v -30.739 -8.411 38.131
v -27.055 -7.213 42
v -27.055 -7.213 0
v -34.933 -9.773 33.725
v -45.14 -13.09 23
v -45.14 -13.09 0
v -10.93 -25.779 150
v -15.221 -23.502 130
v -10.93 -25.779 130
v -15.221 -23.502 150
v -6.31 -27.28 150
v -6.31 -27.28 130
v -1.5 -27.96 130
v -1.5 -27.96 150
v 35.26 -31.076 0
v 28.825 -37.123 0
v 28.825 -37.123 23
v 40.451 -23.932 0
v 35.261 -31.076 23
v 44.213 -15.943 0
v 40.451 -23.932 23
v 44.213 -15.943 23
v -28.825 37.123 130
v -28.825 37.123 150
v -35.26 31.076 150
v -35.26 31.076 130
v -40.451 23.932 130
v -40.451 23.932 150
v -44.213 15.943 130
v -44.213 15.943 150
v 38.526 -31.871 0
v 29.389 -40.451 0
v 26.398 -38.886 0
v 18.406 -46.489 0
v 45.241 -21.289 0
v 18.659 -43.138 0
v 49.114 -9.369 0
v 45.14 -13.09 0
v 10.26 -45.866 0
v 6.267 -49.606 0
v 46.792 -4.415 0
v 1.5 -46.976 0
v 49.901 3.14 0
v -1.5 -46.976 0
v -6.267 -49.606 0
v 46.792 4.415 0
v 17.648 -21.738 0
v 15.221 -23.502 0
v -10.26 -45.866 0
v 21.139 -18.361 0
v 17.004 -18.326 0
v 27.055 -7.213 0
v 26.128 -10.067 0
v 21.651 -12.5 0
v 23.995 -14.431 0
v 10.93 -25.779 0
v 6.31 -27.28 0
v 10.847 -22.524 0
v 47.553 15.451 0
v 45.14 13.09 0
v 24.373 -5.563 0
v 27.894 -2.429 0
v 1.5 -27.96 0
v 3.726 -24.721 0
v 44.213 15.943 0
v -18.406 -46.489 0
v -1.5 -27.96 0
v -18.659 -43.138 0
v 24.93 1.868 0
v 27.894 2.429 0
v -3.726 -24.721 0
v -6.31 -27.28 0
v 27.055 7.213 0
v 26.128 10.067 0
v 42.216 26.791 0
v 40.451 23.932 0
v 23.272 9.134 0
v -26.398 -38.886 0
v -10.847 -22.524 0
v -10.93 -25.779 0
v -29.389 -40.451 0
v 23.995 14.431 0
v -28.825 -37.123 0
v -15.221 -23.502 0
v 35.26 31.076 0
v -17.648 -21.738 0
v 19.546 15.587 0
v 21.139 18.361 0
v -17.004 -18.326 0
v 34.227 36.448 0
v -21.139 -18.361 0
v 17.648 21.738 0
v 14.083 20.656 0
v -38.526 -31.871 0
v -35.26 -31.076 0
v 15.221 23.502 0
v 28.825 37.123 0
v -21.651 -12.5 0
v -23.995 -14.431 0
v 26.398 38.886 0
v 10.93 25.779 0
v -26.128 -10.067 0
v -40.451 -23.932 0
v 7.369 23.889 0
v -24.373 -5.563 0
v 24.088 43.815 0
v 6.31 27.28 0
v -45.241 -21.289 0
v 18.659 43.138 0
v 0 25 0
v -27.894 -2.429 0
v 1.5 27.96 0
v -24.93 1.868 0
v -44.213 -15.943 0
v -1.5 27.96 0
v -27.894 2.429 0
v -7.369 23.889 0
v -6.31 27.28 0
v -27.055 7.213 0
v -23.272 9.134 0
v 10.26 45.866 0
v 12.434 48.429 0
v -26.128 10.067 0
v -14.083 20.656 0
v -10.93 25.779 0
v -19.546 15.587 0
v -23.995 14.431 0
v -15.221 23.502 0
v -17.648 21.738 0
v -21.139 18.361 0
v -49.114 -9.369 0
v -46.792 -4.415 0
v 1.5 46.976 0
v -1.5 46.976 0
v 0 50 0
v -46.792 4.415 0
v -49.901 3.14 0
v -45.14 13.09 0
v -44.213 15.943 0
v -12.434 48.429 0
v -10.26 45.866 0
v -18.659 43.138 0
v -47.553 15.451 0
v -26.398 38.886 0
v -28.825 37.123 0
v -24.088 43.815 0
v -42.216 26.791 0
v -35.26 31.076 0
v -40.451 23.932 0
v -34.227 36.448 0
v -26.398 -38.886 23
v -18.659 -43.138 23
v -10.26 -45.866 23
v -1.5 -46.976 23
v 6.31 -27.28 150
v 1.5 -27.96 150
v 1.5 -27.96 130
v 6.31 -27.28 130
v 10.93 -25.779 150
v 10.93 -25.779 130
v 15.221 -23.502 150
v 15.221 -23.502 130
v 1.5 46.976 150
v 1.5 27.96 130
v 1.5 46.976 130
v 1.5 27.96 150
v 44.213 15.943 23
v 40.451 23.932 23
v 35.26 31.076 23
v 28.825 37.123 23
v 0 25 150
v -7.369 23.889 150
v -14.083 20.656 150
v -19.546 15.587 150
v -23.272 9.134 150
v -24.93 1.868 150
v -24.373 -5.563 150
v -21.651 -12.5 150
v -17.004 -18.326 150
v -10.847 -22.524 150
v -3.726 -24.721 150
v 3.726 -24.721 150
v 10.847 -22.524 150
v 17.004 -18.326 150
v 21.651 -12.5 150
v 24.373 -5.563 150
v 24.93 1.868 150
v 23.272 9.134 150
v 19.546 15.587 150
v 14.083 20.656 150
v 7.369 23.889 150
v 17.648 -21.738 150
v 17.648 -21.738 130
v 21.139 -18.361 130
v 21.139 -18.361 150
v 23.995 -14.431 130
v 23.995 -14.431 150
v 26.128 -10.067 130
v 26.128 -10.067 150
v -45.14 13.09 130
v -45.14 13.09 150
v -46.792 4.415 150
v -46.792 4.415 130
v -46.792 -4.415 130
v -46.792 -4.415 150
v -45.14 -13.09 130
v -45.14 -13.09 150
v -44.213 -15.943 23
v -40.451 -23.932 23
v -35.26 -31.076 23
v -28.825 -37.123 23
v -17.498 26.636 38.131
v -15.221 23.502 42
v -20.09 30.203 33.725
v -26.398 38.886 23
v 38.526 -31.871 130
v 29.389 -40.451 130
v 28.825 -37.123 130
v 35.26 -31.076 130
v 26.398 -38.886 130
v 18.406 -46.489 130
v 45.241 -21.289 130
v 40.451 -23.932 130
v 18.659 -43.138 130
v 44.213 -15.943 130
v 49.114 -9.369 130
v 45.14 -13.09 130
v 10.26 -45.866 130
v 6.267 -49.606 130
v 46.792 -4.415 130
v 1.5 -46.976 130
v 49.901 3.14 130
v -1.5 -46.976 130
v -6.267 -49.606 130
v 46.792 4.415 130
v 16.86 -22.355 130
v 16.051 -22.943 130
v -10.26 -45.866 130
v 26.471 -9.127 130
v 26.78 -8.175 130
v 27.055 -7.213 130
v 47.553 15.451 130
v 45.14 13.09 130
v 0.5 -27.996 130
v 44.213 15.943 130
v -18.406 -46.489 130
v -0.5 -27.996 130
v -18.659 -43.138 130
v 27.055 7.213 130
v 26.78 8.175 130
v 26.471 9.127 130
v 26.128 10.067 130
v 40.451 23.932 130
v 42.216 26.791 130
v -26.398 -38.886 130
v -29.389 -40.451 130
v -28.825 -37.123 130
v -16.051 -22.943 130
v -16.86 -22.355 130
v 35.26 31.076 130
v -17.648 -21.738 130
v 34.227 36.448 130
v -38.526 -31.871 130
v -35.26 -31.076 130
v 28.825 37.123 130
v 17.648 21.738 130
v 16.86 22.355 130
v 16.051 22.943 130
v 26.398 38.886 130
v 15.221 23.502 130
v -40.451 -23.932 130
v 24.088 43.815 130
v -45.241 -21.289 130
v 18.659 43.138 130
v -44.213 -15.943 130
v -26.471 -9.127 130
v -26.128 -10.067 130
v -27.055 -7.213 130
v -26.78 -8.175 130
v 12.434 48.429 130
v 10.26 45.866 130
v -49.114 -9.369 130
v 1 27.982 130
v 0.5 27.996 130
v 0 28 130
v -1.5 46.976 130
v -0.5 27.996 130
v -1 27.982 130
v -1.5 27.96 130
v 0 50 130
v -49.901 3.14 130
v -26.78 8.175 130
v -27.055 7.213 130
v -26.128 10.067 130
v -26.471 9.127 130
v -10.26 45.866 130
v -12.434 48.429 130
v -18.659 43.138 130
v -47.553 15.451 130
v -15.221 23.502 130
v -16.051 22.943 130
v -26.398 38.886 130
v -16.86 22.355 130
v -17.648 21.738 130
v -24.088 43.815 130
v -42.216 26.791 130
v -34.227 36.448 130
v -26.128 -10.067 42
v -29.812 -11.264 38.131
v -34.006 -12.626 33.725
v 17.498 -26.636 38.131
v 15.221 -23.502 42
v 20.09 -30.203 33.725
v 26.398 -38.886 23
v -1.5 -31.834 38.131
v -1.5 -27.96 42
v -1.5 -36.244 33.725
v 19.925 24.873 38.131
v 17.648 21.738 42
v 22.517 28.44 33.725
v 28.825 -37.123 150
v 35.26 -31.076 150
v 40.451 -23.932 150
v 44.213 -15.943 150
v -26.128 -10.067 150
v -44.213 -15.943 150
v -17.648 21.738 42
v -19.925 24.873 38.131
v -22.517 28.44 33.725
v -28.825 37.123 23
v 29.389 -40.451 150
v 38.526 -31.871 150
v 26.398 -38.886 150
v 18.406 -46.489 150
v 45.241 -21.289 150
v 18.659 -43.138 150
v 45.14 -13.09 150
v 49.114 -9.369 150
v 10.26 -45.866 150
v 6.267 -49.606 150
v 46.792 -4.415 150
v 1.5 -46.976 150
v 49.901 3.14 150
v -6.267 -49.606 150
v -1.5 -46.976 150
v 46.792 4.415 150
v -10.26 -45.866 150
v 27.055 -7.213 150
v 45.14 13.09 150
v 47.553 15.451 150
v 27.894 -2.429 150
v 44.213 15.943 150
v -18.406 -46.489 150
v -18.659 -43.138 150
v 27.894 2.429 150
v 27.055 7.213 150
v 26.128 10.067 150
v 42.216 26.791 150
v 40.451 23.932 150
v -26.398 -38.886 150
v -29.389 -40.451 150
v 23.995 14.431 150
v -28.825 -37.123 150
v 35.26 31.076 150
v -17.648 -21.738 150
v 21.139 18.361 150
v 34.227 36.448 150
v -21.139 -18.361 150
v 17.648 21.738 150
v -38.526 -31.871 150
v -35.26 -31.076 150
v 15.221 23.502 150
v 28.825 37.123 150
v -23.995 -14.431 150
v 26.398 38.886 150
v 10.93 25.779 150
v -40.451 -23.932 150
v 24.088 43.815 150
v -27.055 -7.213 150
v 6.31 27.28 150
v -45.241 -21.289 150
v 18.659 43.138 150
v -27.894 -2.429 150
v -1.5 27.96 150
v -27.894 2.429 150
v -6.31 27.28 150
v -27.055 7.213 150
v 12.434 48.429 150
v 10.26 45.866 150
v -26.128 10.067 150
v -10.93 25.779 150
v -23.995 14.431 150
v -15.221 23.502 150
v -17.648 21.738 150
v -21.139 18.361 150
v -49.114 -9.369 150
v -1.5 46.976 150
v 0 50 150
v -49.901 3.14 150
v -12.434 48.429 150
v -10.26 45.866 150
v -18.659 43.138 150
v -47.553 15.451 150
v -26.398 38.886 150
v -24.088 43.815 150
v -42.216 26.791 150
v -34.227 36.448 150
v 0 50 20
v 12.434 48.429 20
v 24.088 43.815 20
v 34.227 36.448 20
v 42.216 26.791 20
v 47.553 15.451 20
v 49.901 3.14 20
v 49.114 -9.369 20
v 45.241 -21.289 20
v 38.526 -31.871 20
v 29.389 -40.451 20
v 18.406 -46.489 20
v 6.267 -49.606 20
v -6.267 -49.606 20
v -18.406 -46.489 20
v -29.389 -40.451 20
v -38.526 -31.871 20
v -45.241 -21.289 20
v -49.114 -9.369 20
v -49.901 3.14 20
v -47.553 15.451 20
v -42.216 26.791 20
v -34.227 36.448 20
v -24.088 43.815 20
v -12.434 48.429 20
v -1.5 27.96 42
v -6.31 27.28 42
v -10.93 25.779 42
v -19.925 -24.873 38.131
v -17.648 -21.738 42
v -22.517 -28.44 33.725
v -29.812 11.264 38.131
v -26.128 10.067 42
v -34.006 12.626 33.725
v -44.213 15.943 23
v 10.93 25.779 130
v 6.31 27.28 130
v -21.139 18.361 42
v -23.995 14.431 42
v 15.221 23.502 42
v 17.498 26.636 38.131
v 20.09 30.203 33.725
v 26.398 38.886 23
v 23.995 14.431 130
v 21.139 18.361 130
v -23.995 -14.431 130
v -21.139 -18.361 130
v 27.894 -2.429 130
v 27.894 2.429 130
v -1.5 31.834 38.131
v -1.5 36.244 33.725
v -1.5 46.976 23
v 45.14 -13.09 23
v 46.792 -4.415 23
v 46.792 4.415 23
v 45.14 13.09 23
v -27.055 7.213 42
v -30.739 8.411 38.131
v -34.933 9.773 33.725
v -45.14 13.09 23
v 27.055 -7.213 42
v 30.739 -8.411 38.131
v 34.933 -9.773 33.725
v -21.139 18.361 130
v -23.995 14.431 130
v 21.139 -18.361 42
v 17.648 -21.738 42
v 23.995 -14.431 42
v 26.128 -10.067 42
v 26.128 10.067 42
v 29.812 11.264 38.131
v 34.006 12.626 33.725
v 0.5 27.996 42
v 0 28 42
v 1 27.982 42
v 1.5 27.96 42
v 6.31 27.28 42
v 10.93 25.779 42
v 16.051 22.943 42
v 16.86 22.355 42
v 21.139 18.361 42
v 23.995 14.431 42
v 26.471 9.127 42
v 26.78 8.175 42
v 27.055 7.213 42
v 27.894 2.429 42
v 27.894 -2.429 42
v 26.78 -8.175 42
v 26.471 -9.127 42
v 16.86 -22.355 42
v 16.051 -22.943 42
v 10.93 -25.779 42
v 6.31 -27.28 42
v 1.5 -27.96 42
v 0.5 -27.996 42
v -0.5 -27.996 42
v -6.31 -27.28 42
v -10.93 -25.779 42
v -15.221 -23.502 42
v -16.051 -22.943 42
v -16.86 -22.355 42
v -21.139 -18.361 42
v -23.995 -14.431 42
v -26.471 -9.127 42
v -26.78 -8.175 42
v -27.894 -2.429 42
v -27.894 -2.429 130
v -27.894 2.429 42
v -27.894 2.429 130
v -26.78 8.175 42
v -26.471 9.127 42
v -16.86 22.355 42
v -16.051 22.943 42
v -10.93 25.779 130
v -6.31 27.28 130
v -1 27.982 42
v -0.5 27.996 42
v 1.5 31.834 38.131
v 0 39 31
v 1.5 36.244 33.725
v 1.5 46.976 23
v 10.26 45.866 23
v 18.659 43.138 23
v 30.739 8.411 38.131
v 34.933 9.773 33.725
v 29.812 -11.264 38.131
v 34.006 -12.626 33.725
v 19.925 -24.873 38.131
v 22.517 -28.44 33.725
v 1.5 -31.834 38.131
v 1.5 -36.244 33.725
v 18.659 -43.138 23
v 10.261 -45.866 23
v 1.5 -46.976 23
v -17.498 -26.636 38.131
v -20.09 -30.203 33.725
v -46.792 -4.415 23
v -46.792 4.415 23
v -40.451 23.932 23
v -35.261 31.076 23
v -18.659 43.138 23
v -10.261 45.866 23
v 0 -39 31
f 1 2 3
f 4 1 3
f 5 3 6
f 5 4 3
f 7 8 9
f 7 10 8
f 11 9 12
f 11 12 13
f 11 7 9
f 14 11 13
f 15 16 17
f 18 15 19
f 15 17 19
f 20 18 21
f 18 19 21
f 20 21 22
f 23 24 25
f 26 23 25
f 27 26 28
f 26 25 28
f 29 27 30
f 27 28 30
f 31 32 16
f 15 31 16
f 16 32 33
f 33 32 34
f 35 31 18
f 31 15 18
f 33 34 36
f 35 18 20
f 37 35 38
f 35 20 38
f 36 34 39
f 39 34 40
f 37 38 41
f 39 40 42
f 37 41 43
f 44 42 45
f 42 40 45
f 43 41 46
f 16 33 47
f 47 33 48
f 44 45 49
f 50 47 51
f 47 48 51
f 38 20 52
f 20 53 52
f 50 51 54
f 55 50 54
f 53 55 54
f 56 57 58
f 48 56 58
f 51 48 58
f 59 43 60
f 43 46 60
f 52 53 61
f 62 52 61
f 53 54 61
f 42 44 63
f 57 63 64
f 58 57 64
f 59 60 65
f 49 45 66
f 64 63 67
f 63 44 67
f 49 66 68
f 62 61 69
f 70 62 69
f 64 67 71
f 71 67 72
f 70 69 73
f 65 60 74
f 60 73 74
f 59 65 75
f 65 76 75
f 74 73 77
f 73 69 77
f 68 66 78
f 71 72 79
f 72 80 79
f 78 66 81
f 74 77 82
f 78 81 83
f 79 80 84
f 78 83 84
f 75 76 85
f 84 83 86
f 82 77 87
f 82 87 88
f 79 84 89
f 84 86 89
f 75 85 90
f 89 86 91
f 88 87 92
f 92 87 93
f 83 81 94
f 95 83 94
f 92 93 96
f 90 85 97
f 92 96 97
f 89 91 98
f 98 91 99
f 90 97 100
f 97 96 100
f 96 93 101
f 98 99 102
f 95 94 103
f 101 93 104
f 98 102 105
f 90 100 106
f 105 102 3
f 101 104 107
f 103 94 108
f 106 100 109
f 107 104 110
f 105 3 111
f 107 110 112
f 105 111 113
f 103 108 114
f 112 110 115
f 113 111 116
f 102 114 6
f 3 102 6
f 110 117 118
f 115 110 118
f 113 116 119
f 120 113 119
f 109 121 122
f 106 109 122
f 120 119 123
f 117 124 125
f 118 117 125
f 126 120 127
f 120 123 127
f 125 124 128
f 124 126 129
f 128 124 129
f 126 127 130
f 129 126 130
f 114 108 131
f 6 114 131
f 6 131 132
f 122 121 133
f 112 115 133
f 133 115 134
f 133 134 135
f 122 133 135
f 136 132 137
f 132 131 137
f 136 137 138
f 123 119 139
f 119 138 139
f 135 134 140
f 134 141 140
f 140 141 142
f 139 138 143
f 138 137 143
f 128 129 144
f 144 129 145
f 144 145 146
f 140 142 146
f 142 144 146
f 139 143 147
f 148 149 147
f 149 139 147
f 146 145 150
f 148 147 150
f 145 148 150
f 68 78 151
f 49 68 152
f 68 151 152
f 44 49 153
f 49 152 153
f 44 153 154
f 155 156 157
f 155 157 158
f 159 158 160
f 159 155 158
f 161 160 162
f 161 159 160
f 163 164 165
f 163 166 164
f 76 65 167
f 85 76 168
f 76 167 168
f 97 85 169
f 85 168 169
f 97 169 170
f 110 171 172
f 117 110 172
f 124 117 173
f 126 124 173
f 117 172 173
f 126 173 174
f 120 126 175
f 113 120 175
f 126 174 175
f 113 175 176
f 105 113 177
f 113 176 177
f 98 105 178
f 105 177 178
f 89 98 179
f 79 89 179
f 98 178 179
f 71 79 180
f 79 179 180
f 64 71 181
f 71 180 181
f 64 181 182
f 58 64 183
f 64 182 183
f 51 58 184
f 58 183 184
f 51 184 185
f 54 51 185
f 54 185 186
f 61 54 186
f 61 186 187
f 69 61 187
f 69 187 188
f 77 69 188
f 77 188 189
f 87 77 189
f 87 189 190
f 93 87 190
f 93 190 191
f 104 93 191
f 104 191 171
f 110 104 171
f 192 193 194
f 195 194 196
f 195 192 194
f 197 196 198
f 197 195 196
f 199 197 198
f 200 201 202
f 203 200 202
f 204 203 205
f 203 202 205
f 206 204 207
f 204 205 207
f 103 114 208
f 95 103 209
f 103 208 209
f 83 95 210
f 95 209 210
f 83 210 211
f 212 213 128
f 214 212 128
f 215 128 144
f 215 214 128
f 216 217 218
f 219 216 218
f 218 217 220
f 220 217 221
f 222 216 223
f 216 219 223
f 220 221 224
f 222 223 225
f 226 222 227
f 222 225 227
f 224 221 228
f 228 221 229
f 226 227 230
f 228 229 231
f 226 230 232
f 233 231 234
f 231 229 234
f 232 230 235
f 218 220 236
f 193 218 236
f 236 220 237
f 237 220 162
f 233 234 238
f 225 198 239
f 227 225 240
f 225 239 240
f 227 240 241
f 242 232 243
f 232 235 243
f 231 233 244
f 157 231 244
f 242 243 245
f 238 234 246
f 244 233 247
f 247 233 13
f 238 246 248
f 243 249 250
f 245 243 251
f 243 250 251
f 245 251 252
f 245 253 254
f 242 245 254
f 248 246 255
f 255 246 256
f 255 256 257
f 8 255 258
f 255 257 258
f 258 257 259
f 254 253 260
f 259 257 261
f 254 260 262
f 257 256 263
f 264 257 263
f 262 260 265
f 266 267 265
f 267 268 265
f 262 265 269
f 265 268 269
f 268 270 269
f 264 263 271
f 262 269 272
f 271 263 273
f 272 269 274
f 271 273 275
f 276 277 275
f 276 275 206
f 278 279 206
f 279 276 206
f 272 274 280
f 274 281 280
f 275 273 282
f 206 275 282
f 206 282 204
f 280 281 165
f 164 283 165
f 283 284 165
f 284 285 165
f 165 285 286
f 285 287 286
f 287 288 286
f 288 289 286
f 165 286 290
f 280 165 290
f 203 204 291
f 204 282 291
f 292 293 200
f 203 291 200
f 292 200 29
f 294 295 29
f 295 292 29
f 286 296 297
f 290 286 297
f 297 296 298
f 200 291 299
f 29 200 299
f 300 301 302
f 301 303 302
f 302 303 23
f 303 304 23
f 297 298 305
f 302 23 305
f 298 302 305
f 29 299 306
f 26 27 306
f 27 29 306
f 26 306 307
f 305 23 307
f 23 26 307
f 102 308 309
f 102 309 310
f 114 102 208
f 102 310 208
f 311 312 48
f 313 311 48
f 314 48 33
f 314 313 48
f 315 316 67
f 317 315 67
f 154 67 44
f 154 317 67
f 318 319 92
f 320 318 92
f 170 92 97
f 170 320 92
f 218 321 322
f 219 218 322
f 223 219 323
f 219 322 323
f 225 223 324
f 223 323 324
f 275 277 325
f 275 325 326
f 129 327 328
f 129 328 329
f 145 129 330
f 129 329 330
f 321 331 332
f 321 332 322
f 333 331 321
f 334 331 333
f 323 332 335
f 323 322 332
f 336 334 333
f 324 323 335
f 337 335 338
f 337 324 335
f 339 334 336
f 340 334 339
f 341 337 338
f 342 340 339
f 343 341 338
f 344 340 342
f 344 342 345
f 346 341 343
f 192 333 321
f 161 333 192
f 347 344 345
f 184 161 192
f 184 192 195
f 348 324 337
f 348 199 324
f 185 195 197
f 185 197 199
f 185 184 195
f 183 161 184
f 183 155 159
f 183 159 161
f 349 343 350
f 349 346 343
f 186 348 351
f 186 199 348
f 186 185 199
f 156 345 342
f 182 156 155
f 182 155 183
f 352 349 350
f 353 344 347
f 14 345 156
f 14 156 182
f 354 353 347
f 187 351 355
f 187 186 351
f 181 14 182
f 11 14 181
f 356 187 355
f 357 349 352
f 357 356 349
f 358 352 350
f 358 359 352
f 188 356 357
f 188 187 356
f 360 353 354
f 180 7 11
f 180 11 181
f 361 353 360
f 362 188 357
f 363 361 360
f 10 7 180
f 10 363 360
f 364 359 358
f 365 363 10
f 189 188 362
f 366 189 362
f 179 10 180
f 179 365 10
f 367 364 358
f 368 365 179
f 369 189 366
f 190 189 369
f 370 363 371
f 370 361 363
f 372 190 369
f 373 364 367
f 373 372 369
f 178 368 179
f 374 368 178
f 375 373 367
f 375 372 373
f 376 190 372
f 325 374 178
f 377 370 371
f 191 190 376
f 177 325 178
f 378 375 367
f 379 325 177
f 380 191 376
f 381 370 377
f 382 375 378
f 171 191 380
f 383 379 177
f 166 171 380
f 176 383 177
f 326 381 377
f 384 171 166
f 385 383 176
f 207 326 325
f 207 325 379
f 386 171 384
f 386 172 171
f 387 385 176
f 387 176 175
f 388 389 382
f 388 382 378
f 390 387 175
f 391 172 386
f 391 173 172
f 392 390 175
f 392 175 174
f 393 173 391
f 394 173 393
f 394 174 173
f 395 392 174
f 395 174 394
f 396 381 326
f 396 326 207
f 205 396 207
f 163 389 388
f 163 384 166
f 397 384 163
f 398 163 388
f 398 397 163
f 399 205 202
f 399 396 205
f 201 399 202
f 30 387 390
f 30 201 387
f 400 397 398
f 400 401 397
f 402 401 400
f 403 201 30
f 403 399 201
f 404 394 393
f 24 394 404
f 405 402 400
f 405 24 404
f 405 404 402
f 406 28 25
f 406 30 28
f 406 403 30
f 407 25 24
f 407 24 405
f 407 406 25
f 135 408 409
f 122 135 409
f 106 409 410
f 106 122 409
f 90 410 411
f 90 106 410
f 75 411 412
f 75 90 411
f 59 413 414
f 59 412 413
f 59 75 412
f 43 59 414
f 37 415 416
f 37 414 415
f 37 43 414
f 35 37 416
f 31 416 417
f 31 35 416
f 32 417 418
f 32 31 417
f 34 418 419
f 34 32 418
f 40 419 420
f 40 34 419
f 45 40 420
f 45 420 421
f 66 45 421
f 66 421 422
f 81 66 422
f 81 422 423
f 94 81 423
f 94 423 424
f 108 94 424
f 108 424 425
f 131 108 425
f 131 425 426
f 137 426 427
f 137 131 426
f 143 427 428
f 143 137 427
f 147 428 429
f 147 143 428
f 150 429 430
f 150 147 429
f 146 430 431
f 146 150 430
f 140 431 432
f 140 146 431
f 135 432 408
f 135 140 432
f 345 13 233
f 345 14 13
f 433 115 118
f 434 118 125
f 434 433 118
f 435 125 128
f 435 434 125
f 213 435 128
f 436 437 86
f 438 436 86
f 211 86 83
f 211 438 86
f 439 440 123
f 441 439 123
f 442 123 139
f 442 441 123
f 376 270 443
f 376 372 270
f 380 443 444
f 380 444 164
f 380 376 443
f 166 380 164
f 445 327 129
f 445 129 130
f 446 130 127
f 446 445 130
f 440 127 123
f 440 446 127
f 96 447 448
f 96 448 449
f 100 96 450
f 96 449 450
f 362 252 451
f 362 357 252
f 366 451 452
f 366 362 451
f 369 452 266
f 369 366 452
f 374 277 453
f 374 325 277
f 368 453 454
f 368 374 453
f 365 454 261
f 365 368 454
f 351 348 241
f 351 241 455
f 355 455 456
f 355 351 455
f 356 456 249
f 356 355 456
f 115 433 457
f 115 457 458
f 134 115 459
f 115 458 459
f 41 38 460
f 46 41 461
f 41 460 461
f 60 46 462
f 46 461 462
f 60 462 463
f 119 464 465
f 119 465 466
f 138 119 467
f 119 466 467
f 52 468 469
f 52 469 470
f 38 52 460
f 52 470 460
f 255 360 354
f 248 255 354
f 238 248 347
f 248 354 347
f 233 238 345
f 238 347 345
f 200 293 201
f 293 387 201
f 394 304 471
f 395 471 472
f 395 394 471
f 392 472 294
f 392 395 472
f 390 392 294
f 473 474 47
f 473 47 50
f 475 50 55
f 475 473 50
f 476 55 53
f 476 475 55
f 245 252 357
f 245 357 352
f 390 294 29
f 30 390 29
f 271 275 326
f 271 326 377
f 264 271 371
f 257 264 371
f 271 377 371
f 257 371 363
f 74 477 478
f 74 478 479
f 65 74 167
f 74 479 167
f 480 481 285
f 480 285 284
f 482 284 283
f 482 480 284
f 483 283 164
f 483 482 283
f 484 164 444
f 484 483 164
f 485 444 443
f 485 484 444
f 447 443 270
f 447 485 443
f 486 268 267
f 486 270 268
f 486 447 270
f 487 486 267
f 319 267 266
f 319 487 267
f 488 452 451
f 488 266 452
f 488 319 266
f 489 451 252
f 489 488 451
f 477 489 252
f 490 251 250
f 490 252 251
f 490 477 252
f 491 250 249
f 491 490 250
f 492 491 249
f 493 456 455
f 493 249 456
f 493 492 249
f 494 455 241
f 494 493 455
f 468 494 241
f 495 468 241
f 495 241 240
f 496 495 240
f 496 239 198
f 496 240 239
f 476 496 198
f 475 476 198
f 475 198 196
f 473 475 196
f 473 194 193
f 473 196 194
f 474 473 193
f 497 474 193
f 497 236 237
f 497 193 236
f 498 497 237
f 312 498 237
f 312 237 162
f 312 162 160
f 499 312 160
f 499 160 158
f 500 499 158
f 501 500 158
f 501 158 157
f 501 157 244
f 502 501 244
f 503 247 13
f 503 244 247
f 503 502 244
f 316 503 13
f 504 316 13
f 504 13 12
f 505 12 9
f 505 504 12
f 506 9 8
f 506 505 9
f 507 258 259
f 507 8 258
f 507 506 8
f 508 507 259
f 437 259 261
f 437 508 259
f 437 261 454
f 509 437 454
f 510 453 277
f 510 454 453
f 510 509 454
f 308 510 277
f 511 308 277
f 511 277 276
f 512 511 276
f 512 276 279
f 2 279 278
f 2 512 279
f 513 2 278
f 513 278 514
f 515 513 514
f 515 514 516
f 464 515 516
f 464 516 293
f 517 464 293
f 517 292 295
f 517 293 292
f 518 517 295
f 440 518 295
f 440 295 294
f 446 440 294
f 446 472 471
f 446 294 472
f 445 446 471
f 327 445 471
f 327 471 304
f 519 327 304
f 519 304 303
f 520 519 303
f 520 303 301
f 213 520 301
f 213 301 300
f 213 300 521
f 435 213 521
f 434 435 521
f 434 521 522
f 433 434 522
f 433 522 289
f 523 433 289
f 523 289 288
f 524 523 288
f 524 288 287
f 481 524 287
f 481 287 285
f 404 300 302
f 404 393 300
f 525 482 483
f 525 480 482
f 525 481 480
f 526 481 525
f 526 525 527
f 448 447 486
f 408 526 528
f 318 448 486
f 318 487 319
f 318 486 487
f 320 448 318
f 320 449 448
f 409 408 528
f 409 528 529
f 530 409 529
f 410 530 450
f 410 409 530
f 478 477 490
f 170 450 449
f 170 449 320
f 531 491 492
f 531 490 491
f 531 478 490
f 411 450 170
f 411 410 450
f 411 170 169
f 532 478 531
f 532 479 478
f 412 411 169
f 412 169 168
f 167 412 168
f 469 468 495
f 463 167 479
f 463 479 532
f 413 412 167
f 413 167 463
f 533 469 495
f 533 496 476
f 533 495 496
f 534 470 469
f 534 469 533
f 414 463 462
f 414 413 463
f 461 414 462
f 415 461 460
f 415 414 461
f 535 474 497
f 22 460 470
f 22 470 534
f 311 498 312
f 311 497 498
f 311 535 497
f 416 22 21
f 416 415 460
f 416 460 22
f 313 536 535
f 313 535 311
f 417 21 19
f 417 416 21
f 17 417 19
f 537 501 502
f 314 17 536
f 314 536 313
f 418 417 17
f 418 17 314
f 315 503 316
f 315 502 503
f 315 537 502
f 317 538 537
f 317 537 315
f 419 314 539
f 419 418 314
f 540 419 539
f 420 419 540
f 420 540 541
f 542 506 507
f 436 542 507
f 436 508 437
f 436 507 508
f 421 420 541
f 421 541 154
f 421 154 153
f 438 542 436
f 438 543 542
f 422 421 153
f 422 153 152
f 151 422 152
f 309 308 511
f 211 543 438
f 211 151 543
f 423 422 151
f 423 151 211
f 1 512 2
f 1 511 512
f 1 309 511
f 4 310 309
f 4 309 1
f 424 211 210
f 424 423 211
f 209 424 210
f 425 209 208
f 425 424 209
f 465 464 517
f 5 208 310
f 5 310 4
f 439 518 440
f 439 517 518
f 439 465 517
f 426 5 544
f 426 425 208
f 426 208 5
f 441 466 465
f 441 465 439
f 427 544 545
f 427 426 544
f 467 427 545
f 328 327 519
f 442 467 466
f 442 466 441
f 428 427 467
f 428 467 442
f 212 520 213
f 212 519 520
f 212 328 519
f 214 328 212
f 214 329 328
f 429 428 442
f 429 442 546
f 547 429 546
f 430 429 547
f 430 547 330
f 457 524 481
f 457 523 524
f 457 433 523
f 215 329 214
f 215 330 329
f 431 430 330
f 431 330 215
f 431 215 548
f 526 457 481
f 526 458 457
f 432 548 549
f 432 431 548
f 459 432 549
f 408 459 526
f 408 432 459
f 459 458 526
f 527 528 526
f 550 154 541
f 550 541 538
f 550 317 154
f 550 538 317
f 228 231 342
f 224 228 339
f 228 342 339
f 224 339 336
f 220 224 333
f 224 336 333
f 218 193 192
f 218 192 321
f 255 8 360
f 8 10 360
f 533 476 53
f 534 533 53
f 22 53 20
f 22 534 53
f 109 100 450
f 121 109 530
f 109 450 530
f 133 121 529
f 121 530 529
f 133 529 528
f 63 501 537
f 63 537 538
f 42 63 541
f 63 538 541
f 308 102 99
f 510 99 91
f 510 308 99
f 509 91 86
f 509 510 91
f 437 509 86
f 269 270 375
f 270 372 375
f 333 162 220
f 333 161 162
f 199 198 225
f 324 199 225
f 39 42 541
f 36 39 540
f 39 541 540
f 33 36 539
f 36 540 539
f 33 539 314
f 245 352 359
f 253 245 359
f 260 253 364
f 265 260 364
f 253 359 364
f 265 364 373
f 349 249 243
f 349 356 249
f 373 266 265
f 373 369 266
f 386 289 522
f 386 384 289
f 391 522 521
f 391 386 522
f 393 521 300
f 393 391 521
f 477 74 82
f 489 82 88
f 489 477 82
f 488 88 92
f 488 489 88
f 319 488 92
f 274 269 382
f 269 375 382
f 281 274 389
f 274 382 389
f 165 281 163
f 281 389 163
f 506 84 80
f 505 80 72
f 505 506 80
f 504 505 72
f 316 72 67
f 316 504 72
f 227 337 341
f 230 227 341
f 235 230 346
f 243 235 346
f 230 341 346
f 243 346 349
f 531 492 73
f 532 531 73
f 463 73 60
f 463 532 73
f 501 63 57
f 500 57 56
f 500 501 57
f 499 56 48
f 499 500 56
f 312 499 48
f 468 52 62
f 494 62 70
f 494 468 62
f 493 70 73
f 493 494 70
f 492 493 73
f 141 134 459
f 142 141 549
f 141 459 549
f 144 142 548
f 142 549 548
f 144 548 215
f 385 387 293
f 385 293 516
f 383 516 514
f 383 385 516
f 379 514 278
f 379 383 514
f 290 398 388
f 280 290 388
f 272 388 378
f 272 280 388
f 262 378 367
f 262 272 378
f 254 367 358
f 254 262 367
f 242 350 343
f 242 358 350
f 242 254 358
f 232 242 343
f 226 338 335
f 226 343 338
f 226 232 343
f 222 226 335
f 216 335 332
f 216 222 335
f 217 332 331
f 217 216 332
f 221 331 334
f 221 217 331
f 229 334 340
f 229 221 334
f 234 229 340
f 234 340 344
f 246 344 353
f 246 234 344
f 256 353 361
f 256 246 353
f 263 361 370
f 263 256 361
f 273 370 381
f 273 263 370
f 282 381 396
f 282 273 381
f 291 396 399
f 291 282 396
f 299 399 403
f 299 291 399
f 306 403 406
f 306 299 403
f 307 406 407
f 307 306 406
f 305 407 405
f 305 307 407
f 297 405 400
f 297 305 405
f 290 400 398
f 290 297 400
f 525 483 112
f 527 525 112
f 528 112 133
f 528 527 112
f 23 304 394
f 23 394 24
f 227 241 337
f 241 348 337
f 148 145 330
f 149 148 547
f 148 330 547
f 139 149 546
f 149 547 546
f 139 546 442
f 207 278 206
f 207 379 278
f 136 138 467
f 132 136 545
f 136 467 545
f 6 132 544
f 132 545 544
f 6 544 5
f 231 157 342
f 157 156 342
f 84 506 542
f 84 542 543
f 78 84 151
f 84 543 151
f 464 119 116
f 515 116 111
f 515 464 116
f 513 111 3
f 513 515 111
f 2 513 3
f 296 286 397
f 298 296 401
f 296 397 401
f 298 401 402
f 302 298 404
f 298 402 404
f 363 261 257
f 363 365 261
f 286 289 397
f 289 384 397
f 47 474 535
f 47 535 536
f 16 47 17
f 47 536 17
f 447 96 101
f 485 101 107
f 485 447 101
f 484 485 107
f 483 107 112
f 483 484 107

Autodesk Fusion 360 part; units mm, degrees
sketch "Sketch1" plane through (0, 0, 0) normal (1, 0, 0) x (0, 1, 0)
  line L0 (25, 0) -> (25, 150)
  line L1 (25, 150) -> (50, 150)
  line L2 (50, 150) -> (50, 130)
  line L3 (50, 130) -> (28, 130)
  line L4 (28, 130) -> (28, 42)
  line L5 (28, 42) -> (50, 20)
  line L6 (50, 20) -> (50, 0)
  line L7 (50, 0) -> (25, 0)
  line L8 (0, 0) -> (0, 146.3043) construction
  dimension "d1" = 3
  dimension "d2" = 25
  dimension "d3" = 150
  dimension "d4" = 50
  dimension "d5" = 20
  dimension "d6" = 20
  dimension "d7" = 135
revolve "Revolve1" add sketch "Sketch1" angle 360 about axis through (0, 0, 0) along (0, 0, 1)
sketch "Sketch2" plane through (0, 0, 150) normal (0, 0, 1) x (-1, 0, 0)
  circle A0 centre (0, 0) radius 25
  circle A1 centre (0, 0) radius 50
  line L0 (0, 0) -> (-29.3893, 40.4508) construction
  line L1 (0, 0) -> (0, 50) construction
  arc A2 (-1.5, 27.9598) -> (-15.2208, 23.5016) centre (0, 0) ccw
  arc A3 (-1.5, 46.9761) -> (-26.3983, 38.8861) centre (0, 0) ccw
  line L2 (-1.5, 27.9598) -> (-1.5, 46.9761)
  line L3 (-15.2208, 23.5016) -> (-26.3983, 38.8861)
  dimension "d9" = 36
  dimension "d10" = 1.5
  dimension "d11" = 1.5
  dimension "d12" = 3
  dimension "d13" = 3
extrude "Extrude1" cut sketch "Sketch2" against normal up to surface (150 mm away) contours A2 A3 L2 L3
pattern_circular "C-Pattern1" count 10 over 360 about axis through (0, 0, 150) along (0, 0, -1) of "Extrude1"
